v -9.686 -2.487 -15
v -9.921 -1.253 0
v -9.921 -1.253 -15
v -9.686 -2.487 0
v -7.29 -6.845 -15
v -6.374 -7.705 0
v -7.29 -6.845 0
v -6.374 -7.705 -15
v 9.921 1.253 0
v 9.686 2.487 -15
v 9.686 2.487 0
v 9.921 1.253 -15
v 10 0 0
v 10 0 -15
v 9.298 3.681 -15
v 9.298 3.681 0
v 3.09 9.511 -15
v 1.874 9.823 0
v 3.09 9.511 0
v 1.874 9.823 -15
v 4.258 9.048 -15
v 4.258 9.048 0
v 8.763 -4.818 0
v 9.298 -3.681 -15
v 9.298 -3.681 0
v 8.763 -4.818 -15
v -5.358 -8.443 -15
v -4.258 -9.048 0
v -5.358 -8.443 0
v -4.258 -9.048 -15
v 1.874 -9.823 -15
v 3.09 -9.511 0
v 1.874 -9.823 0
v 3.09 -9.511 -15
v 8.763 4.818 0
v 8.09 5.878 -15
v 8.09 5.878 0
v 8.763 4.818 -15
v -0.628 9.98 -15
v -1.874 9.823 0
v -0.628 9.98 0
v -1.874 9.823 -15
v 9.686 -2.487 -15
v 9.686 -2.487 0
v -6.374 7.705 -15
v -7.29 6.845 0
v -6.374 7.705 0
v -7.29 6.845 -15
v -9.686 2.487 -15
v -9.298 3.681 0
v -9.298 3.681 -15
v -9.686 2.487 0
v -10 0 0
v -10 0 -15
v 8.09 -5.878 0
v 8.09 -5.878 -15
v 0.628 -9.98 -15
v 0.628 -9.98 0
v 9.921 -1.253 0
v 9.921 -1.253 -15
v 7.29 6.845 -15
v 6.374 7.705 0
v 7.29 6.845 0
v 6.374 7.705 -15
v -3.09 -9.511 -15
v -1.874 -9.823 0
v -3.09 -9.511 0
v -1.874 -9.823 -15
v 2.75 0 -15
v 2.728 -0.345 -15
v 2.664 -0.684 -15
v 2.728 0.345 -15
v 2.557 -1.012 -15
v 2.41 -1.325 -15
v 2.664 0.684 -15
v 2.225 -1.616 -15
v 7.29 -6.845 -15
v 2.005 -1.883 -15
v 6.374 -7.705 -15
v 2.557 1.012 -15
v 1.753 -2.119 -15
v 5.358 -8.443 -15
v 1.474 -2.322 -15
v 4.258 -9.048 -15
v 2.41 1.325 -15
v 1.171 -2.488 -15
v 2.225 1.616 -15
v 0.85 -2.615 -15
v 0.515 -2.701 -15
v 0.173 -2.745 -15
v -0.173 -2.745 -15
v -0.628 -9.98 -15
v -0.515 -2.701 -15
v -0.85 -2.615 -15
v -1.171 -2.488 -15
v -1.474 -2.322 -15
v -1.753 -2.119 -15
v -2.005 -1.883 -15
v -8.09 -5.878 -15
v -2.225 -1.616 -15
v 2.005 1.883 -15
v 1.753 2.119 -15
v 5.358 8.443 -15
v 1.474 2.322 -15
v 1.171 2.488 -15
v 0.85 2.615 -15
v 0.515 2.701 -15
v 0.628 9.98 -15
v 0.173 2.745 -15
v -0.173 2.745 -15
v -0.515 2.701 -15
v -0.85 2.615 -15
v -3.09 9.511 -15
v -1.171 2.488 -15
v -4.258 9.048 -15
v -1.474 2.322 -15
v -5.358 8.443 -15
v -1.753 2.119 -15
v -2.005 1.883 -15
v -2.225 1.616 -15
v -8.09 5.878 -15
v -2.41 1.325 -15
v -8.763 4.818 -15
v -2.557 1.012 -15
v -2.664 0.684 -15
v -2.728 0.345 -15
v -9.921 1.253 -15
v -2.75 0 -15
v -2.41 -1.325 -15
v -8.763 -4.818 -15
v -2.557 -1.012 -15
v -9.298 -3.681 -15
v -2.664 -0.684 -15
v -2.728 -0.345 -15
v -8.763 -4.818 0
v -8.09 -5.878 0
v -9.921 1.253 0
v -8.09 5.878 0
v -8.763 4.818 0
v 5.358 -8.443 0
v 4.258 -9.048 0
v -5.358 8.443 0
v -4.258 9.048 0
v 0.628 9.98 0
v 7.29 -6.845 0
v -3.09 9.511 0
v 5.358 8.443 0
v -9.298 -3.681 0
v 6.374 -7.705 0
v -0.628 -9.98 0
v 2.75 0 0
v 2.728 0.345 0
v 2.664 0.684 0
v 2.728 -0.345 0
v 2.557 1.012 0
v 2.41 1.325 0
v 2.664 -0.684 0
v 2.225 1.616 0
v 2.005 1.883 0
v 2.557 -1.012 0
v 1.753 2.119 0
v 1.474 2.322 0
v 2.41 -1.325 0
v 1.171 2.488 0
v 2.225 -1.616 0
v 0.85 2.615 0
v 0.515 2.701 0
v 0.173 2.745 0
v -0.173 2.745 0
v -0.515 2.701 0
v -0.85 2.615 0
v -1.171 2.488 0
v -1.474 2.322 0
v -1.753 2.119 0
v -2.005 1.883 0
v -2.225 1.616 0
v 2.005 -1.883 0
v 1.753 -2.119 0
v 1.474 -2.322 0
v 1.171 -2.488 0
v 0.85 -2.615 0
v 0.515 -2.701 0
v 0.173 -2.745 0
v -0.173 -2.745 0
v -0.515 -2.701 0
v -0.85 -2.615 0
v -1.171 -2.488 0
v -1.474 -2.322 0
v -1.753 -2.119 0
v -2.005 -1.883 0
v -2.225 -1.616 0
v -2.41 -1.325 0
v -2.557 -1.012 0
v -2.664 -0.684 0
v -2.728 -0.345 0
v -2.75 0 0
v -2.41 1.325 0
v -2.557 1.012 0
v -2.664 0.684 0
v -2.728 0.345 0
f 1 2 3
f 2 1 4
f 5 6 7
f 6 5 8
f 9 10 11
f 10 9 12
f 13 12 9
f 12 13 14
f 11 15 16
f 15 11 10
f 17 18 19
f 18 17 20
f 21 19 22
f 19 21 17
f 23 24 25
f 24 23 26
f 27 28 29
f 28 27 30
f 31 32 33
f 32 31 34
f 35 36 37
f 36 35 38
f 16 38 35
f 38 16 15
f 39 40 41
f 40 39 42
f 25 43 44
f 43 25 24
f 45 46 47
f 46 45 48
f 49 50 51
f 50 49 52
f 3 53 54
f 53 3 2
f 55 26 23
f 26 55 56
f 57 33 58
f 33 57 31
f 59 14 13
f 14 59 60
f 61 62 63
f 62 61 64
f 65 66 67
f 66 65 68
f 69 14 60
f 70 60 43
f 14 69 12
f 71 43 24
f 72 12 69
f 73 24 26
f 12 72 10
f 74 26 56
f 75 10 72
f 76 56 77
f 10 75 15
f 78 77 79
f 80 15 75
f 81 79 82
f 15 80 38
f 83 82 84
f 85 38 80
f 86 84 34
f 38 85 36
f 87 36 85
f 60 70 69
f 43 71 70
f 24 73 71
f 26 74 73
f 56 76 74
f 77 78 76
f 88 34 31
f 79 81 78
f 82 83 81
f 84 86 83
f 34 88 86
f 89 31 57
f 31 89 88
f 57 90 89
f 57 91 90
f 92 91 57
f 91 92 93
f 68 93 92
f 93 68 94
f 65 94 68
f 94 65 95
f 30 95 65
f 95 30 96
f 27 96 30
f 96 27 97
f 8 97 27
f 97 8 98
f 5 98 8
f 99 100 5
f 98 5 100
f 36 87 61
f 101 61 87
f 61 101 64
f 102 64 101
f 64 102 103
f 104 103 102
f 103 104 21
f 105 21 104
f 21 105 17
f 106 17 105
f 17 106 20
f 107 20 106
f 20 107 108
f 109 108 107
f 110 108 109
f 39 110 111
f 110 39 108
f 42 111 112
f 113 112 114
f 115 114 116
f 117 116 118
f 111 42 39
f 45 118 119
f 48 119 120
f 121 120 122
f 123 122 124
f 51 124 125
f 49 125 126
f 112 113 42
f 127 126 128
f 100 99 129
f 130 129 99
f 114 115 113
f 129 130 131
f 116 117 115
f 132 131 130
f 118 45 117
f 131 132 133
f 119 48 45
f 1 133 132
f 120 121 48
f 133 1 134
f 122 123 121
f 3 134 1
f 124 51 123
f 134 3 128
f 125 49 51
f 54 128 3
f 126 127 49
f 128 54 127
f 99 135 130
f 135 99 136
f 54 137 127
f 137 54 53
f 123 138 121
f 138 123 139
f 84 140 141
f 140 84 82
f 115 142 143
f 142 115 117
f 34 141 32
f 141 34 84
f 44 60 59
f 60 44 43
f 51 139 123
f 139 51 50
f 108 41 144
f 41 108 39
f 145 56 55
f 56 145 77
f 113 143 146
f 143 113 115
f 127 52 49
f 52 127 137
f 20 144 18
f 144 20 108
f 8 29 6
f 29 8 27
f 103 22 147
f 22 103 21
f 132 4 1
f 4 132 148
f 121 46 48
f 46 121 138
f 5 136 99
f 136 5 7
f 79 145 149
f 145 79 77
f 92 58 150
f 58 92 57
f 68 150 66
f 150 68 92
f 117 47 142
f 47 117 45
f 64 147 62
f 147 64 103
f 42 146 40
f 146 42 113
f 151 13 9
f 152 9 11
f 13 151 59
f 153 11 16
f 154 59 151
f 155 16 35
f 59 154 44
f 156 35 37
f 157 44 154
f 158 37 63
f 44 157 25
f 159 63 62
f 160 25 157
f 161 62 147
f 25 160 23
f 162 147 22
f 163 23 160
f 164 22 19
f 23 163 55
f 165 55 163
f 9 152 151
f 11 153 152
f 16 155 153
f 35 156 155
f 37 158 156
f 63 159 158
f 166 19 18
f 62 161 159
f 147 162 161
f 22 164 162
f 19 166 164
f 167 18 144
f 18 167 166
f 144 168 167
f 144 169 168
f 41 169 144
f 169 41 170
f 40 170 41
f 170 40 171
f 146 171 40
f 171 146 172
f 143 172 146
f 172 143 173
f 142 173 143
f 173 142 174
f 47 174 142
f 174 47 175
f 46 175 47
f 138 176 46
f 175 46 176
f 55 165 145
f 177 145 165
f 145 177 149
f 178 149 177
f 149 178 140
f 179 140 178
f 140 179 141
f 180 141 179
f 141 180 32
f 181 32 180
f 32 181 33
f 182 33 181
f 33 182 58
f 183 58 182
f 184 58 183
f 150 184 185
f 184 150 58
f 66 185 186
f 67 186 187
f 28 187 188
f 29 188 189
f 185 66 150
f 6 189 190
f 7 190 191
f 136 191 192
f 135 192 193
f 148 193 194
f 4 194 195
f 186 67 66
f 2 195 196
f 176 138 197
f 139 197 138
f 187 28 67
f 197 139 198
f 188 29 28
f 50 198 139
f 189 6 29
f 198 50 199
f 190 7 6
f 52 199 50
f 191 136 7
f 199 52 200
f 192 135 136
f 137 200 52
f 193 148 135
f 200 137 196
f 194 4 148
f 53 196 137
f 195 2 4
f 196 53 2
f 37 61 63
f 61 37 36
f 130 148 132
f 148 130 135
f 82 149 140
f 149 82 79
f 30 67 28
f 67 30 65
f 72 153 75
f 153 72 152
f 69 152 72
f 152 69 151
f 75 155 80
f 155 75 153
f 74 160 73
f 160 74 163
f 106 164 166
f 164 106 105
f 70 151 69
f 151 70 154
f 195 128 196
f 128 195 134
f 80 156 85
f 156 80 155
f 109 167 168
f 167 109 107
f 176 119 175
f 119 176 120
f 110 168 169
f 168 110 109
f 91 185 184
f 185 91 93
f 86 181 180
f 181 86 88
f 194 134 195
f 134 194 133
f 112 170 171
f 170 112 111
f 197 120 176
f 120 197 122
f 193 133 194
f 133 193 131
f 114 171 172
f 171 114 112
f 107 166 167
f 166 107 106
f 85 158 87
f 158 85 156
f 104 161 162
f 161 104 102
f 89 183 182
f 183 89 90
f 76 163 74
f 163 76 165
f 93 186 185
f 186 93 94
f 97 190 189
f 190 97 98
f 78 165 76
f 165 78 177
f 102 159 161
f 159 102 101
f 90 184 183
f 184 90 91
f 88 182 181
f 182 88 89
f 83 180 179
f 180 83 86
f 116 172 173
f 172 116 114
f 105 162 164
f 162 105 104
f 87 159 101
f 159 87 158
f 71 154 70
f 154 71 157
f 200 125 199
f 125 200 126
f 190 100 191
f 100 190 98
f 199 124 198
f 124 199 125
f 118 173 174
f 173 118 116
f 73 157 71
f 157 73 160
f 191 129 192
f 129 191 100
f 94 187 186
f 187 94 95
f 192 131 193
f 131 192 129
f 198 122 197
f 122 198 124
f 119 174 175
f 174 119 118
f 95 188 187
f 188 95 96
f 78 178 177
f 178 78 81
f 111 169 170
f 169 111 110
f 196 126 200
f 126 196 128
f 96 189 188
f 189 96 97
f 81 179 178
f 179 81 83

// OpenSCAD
$fn = 50;


difference() {
	union() {
		translate(v = [0, 0, -15.0000000000]) {
			cylinder(h = 15, r = 10.0000000000);
		}
		cylinder(h = 0, r = 20.0000000000);
	}
	union() {
		#translate(v = [0, 0, -15]) {
			cylinder(h = 15, r = 2.7500000000);
		}
	}
}
